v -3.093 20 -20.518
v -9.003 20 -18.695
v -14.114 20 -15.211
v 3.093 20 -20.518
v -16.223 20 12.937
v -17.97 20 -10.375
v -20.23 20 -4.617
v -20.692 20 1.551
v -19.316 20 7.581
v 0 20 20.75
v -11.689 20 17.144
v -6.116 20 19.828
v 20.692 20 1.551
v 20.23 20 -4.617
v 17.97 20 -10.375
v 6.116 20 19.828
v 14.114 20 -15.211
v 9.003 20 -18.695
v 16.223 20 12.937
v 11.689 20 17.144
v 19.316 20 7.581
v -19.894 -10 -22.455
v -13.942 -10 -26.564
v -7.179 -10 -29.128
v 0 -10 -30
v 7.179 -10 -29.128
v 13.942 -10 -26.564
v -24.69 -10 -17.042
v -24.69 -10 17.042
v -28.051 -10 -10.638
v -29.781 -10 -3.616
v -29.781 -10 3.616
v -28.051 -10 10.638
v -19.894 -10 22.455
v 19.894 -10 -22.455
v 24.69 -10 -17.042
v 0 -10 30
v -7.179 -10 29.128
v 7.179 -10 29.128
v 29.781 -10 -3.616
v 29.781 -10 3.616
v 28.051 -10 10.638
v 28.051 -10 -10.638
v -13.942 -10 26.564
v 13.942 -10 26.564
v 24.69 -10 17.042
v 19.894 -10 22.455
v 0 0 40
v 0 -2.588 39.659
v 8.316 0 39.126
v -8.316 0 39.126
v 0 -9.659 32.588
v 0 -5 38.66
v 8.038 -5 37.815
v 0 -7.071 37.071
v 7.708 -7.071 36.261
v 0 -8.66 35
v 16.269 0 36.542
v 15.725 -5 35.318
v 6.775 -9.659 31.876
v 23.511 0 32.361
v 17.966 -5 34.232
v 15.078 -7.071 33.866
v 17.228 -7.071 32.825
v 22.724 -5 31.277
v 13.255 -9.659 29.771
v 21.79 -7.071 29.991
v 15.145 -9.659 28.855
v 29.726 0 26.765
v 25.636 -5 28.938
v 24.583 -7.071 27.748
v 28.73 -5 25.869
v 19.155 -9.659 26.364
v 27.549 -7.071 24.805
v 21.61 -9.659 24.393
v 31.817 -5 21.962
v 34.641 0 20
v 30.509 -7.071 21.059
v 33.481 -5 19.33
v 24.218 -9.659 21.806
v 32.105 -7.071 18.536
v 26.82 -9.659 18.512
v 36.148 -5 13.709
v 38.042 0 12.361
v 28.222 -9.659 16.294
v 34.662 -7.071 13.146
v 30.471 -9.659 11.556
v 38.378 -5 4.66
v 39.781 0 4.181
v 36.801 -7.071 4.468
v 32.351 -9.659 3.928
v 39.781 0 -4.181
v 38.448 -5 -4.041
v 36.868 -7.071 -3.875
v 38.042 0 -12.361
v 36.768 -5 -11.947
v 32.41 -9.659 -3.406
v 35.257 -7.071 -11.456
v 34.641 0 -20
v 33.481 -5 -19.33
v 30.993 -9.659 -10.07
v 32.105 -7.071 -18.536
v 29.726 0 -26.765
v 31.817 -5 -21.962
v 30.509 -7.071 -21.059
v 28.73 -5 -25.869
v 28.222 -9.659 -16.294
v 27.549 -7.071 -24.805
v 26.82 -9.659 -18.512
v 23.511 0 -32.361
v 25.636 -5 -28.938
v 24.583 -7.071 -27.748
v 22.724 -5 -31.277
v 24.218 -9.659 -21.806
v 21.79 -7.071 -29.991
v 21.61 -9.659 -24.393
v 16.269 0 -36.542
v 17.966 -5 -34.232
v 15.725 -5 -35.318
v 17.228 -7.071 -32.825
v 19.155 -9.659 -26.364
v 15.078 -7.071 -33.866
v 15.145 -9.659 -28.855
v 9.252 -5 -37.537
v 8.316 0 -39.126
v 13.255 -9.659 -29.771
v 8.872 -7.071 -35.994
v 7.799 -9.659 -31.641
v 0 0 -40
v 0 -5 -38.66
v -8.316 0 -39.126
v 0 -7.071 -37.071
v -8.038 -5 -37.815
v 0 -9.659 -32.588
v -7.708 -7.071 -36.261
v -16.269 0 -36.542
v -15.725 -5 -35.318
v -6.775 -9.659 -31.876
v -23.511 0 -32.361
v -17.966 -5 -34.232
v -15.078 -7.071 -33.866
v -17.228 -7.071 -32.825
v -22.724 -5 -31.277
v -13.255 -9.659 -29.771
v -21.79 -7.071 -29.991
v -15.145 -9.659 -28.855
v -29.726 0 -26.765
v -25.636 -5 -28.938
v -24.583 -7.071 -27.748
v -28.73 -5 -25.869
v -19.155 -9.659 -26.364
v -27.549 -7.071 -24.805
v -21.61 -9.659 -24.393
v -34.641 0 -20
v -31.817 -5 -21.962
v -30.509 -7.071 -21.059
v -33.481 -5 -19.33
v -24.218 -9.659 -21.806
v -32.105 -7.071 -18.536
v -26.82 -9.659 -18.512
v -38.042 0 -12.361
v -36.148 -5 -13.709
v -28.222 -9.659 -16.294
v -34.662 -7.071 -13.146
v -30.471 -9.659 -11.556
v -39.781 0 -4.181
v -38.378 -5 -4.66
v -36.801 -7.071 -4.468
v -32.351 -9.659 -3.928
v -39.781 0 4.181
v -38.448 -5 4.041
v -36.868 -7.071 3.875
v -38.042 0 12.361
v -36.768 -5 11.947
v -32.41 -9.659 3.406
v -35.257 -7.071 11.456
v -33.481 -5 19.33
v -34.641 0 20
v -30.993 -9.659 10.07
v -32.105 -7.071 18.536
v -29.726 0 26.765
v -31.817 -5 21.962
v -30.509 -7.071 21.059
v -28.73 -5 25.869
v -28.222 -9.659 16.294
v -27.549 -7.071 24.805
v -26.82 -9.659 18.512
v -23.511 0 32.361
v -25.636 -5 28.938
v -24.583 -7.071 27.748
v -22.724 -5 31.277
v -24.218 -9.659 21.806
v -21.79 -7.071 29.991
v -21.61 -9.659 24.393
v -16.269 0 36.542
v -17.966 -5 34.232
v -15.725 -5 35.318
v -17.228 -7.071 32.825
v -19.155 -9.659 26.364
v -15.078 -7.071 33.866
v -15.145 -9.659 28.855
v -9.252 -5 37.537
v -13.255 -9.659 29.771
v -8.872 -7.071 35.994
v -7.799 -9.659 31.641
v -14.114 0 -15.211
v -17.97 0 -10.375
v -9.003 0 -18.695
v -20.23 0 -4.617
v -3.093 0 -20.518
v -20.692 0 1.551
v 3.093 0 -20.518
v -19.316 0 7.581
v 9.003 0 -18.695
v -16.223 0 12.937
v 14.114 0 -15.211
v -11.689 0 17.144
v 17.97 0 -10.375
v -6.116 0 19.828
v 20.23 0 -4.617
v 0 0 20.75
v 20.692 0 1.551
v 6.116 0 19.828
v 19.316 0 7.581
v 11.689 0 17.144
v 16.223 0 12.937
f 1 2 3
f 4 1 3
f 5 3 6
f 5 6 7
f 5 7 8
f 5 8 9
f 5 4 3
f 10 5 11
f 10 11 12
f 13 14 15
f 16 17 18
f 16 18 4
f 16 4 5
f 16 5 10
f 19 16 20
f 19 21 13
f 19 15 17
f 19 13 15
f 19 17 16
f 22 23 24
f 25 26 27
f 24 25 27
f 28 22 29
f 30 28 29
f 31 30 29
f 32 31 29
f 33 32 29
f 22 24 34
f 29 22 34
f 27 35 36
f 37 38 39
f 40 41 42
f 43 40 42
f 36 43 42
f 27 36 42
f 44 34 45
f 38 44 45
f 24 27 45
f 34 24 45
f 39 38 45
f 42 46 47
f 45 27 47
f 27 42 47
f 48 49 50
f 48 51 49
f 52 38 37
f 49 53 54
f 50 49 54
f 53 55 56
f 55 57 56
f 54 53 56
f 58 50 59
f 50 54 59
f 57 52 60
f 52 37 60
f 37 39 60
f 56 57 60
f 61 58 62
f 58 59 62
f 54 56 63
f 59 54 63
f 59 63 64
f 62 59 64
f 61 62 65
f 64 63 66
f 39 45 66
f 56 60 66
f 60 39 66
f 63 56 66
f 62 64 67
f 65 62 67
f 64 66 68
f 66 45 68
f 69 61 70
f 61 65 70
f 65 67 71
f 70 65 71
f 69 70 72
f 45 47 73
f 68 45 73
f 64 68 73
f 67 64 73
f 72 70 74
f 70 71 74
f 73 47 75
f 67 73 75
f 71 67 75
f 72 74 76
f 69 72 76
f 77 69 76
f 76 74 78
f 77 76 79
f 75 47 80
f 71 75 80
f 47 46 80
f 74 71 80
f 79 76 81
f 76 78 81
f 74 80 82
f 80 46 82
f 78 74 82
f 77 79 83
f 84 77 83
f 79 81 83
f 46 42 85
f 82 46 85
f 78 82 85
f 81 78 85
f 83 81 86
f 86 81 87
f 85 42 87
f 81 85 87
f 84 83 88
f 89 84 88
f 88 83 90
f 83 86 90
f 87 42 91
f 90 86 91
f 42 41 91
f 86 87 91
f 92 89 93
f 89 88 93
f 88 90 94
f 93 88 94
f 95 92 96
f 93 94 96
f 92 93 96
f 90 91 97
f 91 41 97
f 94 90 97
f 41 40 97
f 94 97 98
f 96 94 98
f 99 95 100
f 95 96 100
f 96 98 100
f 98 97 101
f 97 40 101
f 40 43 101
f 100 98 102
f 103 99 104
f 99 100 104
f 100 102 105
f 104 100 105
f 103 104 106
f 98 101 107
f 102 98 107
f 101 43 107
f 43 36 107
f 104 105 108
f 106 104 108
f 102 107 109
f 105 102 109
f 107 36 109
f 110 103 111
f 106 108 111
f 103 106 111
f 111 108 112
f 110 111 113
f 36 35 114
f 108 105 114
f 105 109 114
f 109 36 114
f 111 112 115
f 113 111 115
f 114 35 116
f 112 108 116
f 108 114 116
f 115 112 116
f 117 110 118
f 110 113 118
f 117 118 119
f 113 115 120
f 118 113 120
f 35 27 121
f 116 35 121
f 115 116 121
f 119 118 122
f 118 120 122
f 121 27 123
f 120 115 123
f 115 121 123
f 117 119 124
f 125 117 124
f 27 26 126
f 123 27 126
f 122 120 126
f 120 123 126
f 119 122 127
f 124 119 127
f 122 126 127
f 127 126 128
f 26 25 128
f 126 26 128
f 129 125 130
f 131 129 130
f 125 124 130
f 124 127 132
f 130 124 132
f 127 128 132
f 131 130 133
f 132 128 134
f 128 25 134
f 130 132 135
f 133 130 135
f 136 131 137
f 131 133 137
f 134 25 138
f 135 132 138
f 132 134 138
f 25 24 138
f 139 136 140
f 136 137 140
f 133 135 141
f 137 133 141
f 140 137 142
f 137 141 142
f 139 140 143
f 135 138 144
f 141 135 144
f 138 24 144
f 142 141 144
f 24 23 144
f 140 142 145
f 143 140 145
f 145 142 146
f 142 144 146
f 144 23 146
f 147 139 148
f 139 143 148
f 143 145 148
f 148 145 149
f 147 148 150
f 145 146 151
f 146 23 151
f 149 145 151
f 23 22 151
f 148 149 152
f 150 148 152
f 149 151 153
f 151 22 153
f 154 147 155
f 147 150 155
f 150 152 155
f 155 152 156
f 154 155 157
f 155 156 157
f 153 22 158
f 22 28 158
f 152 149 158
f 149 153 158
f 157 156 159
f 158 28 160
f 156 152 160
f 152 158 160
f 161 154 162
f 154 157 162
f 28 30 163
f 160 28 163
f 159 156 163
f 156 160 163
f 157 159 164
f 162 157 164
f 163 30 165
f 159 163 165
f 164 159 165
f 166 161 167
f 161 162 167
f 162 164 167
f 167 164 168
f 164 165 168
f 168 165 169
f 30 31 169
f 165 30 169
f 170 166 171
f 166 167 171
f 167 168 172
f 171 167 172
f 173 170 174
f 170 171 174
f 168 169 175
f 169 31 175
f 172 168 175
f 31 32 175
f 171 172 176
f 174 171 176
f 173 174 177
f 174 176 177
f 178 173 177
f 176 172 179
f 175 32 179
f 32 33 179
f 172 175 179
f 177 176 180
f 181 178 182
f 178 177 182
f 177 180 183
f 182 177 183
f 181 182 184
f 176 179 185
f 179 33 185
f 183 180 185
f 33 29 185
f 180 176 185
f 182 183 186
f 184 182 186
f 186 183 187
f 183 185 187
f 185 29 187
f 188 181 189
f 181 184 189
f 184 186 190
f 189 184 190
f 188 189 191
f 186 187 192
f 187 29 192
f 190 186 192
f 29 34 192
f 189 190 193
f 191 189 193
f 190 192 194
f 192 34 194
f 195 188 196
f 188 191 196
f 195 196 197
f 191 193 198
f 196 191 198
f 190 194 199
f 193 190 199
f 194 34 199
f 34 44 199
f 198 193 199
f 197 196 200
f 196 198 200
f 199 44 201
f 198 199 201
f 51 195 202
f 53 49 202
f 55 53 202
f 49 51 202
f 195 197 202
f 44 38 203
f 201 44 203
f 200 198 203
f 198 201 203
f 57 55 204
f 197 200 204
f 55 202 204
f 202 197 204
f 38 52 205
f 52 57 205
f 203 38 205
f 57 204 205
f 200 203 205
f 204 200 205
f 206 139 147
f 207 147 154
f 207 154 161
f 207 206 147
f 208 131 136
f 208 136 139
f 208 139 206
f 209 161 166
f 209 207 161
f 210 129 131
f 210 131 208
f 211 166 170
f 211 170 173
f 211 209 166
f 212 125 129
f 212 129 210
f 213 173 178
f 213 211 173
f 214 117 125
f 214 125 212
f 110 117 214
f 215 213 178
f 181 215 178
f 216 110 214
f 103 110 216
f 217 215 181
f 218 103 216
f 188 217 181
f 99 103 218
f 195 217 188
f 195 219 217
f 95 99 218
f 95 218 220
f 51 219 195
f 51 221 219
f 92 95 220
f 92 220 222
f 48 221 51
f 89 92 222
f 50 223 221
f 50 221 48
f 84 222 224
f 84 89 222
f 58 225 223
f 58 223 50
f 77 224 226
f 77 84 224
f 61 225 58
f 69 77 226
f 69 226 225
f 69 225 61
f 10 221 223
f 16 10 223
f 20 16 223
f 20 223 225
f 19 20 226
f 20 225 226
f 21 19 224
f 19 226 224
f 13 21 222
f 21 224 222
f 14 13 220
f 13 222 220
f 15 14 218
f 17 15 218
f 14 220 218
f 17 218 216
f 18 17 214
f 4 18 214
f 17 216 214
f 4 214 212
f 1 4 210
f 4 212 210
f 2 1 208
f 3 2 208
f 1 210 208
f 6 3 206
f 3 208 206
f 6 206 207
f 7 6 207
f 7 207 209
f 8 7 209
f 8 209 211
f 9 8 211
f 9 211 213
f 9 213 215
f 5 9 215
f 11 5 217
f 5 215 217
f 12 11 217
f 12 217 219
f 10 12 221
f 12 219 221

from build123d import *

# Parameters (mm, degrees)
BASE_R              = 40
BOSS_EXTRUDE1_DEPTH = 10
STOPPER_R           = 20.75
BOSS_EXTRUDE2_DEPTH = 20
FILLET1_R           = 10


with BuildPart() as part:
    # base → Boss-Extrude1 (new body)
    with BuildSketch(Plane(origin=(0, 0, 0), x_dir=(1, 0, 0), z_dir=(0, 1, 0))):
        with Locations(Location((0, 0, 0), (0, 0, 270))):
            Circle(BASE_R)
    extrude(amount=-BOSS_EXTRUDE1_DEPTH)

    # stopper → Boss-Extrude2 (add)
    with BuildSketch(Plane(origin=(0, 0, 0), x_dir=(1, 0, 0), z_dir=(0, 1, 0))):
        with Locations(Location((0, 0, 0), (0, 0, 270))):
            Circle(STOPPER_R)
    extrude(amount=BOSS_EXTRUDE2_DEPTH)

    # Fillet1
    fillet1_edges = [part.edges().sort_by_distance(p)[0] for p in [
        (0, -10, -40),
    ]]
    fillet(fillet1_edges, radius=FILLET1_R - 0.0001)  # a hair under: the kernel refuses the full size


solid = part.part
